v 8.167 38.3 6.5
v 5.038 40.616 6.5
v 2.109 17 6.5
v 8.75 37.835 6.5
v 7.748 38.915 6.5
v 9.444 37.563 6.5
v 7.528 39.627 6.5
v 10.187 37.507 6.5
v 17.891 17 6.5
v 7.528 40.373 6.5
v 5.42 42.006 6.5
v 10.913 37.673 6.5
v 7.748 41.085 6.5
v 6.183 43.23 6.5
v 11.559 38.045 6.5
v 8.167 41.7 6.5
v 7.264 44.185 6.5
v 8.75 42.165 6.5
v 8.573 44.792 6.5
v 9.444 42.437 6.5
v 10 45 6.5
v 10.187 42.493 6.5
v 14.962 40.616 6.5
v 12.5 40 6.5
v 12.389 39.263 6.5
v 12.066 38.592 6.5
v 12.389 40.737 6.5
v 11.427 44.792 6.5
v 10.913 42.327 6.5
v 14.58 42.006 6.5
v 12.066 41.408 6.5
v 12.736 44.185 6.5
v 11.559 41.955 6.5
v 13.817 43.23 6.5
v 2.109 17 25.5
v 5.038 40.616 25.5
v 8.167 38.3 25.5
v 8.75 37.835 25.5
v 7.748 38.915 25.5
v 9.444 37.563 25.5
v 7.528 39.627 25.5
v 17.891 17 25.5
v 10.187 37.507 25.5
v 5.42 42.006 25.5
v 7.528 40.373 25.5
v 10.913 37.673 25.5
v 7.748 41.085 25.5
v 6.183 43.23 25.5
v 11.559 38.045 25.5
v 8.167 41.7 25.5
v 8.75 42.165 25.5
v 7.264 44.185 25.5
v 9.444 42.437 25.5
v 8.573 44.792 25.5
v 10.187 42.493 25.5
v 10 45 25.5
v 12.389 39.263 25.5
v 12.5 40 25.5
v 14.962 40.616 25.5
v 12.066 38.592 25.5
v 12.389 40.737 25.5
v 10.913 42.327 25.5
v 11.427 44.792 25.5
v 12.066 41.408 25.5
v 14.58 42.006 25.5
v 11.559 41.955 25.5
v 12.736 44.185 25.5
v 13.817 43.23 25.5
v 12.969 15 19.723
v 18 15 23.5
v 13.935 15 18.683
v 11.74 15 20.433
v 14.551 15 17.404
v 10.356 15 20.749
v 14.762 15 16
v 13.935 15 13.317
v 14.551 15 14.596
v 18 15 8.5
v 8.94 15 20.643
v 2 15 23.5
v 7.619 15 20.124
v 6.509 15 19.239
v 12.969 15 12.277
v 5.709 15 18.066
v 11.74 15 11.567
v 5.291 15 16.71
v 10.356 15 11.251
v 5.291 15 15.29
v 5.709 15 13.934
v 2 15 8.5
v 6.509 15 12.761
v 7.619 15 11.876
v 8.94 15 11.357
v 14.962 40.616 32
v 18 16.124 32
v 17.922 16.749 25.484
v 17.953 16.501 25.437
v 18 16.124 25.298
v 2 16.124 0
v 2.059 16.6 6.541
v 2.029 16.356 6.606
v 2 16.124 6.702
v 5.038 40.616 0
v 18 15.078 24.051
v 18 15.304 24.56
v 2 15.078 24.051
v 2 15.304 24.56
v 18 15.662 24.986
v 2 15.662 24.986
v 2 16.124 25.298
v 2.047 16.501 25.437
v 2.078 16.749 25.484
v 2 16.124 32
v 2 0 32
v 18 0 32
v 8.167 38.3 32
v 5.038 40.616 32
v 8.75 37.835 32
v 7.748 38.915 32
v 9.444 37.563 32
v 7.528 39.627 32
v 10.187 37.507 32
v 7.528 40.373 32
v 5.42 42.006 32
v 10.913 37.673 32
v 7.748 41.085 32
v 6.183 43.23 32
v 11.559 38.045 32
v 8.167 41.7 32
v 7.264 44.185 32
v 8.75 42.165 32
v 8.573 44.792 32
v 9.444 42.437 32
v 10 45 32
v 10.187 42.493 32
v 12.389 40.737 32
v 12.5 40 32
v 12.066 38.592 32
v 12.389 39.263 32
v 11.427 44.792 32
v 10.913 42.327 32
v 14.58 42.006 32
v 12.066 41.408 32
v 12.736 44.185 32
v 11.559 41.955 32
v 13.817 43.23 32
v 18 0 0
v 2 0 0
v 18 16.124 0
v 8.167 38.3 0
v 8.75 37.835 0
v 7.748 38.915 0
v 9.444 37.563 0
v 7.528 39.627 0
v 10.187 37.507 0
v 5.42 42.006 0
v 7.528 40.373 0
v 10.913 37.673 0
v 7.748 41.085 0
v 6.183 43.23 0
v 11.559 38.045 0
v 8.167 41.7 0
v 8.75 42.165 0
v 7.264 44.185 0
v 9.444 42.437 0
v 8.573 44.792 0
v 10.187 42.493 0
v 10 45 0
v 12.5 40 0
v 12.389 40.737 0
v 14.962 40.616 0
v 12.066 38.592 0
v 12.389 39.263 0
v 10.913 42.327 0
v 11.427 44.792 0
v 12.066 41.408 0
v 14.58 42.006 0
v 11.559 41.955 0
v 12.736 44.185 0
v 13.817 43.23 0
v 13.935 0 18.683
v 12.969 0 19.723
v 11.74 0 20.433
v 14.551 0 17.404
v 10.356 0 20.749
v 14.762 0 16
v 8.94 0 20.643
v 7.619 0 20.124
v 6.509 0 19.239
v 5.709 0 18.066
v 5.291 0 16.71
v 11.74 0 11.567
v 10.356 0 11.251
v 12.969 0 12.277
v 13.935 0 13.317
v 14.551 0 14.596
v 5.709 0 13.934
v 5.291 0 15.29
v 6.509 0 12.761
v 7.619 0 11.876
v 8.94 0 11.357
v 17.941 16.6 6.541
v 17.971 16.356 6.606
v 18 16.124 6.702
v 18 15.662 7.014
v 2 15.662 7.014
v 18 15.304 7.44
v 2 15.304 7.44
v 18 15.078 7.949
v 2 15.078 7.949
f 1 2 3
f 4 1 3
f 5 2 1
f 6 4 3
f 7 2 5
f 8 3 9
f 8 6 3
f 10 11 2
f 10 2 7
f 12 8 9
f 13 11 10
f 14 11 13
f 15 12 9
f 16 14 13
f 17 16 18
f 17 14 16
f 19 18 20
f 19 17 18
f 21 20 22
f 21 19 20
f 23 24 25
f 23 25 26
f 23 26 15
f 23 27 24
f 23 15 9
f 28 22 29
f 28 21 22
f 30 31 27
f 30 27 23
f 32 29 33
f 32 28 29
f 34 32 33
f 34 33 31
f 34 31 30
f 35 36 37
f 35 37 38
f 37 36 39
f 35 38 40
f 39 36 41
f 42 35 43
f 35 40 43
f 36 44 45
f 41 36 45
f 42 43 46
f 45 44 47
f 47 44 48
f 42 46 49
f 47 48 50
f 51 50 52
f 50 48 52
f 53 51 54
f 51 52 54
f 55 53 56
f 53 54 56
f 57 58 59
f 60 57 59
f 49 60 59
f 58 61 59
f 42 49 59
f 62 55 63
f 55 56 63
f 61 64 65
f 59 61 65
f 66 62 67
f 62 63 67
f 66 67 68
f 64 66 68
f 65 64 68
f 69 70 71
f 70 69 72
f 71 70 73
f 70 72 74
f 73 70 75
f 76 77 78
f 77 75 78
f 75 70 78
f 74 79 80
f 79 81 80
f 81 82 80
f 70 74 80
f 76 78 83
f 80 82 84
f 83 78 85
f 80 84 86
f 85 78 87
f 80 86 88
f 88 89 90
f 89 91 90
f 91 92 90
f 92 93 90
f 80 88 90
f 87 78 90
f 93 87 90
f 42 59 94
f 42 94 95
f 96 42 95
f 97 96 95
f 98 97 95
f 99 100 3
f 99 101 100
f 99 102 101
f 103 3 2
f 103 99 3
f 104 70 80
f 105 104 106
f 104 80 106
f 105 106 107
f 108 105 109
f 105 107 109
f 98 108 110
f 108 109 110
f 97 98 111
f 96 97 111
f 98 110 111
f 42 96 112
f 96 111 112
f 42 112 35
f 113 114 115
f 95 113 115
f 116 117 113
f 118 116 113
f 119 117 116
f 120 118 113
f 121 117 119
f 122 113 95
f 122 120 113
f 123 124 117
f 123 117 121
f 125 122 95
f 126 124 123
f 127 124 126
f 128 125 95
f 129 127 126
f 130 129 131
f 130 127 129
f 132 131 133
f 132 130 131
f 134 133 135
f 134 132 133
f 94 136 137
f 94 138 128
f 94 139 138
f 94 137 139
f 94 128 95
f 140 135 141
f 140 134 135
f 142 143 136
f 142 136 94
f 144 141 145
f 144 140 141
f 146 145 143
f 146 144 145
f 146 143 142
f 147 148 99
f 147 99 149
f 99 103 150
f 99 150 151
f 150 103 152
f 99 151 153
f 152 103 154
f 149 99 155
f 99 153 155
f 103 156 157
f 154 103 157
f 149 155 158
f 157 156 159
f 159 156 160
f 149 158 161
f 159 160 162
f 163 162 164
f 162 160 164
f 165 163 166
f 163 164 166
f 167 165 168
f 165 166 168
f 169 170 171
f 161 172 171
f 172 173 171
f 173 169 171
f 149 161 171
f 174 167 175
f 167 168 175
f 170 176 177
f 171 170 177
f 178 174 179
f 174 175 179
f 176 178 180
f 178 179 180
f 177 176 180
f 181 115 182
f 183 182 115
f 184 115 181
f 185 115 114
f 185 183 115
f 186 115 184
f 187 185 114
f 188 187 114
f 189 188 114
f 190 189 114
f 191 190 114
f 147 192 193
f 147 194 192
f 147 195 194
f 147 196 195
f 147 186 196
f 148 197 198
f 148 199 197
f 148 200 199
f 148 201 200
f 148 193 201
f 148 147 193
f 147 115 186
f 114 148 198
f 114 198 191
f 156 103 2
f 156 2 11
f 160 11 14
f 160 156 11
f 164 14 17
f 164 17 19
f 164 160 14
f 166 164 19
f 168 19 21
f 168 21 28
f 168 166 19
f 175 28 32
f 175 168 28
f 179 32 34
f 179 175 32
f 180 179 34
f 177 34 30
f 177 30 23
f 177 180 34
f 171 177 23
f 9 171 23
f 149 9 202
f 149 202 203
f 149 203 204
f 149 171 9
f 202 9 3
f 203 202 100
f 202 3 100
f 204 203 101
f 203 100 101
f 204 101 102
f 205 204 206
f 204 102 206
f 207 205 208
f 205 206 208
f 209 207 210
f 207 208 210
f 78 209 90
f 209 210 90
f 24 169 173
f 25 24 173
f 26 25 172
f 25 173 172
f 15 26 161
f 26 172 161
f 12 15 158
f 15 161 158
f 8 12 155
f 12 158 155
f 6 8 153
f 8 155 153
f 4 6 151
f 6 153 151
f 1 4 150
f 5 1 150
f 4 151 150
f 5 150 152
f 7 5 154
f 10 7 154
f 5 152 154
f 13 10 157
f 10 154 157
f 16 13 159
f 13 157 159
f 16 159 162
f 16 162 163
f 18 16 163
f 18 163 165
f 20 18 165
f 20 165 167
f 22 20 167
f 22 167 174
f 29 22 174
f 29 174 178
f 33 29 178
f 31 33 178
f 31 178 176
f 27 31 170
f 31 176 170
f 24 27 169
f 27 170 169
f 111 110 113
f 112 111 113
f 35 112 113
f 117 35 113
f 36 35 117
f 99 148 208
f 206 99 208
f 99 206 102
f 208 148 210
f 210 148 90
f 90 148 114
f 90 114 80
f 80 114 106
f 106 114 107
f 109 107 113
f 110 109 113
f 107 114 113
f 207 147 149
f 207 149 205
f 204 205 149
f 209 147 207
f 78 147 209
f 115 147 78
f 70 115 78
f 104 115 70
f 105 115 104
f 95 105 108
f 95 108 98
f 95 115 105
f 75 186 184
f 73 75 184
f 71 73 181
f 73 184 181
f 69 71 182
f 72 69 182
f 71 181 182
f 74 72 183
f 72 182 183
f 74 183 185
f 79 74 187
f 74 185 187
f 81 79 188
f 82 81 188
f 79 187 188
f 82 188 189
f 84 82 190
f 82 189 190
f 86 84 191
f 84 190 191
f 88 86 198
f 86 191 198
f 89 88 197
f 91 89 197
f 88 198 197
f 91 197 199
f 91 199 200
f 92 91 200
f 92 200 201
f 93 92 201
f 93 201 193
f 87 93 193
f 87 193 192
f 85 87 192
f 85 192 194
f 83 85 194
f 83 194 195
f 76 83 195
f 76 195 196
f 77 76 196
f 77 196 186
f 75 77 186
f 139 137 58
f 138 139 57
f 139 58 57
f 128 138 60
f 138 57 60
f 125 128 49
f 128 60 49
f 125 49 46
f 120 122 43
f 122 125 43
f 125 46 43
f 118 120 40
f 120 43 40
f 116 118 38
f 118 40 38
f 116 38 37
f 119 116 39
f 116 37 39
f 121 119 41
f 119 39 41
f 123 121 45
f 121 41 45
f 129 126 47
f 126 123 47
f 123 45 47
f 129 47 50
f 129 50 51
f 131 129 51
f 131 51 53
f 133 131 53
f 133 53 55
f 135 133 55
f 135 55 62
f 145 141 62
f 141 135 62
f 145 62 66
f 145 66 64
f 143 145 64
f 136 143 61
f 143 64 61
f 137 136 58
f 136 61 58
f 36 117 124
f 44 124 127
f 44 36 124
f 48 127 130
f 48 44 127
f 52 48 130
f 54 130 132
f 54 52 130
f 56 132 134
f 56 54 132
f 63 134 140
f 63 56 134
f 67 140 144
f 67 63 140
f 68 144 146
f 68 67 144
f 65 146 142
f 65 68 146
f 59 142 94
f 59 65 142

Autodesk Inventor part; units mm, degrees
ref_plane "YZ Plane" through (0, 0, 0) normal (1, 0, 0) x (0, 1, 0)
ref_plane "XZ Plane" through (0, 0, 0) normal (0, 1, 0) x (-1, 0, 0)
sketch "Sketch1" plane through (0, 0, 0) normal (0, 0, 1) x (1, 0, 0)
  line L0 (0, 0) -> (5.038, 40.6155)
  circle A0 centre (10, 40) radius 5
  line L1 (14.962, 40.6155) -> (20, 0)
  line L2 (20, 0) -> (0, 0)
  circle A1 centre (10, 40) radius 2.5
  line L3 (2.5, 0) -> (2.5, 20.1545)
  line L4 (17.5, 0) -> (17.5, 20.1545)
  dimension "d0" = 5
  dimension "d1" = 10
  dimension "d2" = 20
  dimension "d3" = 10
  dimension "d4" = 40
  dimension "d19" = 15
  dimension "d20" = 7.5
extrude "Extrusion1" add sketch "Sketch1" along normal blind 32
ref_plane "Work Plane1" through (0, 0, 16) normal (0, 0, 1) x (1, 0, 0)
sketch "Sketch2" plane through (0, 0, 16) normal (0, 0, 1) x (1, 0, 0)
  circle A0 centre (10, 40) radius 2.5 projected
  arc A1 (14.962, 40.6155) -> (5.038, 40.6155) centre (10, 40) ccw projected
  line L0 (20, 0) -> (14.962, 40.6155) projected
  line L1 (0, 0) -> (20, 0) projected
  line L2 (5.038, 40.6155) -> (0, 0) projected
  line L3 (1.8606, 52.4259) -> (18.1394, 52.4259)
  line L4 (18.1394, 52.4259) -> (18.1394, 15)
  line L5 (18.1394, 15) -> (1.8606, 15)
  line L6 (1.8606, 15) -> (1.8606, 52.4259)
  dimension "d21" = 25
extrude "Extrusion2" cut sketch "Sketch2" along normal mid plane 19 contours A0 | L0 L5 L2 A1 | A1 L2 L6 L3 L4 L0
sketch "Sketch3" plane through (0, 0, 0) normal (0, -1, 0) x (1, 0, 0)
  line L0 (0, 0) -> (20, 0) projected
  line L1 (20, 0) -> (20, 32) projected
  line L2 (0, 32) -> (20, 32) projected
  line L3 (0, 0) -> (0, 32) projected
  circle A0 centre (10, 16) radius 4.7625
  dimension "d14" = 9.525
  dimension "d15" = 10
  dimension "d16" = 16
extrude "Extrusion3" cut sketch "Sketch3" against normal up to next contours A0
fillet "Fillet1" radius 2 2 edges at (10, 15, 6.5) (10, 15, 25.5)
sketch "Sketch5" plane through (0, 0, 32) normal (0, 0, 1) x (1, 0, 0)
  line L0 (0, 0) -> (2, 0)
  line L1 (0, 0) -> (20, 0) projected
  line L2 (2, 0) -> (2, 16.1236)
  line L3 (5.038, 40.6155) -> (0, 0) projected
  line L4 (2, 16.1236) -> (0, 0)
  line L5 (0, 0) -> (0, 22.2881)
  line L6 (20, 0) -> (18, 0)
  line L7 (18, 0) -> (18, 16.1236)
  line L8 (18, 16.1236) -> (20, 0)
  line L9 (20, 0) -> (14.962, 40.6155) projected
  dimension "d27" = 2
  dimension "d28" = 2
extrude "Extrusion5" cut sketch "Sketch5" against normal up to next
properties part number "hinge_for_swing" material "Acetal Resin, Black"
